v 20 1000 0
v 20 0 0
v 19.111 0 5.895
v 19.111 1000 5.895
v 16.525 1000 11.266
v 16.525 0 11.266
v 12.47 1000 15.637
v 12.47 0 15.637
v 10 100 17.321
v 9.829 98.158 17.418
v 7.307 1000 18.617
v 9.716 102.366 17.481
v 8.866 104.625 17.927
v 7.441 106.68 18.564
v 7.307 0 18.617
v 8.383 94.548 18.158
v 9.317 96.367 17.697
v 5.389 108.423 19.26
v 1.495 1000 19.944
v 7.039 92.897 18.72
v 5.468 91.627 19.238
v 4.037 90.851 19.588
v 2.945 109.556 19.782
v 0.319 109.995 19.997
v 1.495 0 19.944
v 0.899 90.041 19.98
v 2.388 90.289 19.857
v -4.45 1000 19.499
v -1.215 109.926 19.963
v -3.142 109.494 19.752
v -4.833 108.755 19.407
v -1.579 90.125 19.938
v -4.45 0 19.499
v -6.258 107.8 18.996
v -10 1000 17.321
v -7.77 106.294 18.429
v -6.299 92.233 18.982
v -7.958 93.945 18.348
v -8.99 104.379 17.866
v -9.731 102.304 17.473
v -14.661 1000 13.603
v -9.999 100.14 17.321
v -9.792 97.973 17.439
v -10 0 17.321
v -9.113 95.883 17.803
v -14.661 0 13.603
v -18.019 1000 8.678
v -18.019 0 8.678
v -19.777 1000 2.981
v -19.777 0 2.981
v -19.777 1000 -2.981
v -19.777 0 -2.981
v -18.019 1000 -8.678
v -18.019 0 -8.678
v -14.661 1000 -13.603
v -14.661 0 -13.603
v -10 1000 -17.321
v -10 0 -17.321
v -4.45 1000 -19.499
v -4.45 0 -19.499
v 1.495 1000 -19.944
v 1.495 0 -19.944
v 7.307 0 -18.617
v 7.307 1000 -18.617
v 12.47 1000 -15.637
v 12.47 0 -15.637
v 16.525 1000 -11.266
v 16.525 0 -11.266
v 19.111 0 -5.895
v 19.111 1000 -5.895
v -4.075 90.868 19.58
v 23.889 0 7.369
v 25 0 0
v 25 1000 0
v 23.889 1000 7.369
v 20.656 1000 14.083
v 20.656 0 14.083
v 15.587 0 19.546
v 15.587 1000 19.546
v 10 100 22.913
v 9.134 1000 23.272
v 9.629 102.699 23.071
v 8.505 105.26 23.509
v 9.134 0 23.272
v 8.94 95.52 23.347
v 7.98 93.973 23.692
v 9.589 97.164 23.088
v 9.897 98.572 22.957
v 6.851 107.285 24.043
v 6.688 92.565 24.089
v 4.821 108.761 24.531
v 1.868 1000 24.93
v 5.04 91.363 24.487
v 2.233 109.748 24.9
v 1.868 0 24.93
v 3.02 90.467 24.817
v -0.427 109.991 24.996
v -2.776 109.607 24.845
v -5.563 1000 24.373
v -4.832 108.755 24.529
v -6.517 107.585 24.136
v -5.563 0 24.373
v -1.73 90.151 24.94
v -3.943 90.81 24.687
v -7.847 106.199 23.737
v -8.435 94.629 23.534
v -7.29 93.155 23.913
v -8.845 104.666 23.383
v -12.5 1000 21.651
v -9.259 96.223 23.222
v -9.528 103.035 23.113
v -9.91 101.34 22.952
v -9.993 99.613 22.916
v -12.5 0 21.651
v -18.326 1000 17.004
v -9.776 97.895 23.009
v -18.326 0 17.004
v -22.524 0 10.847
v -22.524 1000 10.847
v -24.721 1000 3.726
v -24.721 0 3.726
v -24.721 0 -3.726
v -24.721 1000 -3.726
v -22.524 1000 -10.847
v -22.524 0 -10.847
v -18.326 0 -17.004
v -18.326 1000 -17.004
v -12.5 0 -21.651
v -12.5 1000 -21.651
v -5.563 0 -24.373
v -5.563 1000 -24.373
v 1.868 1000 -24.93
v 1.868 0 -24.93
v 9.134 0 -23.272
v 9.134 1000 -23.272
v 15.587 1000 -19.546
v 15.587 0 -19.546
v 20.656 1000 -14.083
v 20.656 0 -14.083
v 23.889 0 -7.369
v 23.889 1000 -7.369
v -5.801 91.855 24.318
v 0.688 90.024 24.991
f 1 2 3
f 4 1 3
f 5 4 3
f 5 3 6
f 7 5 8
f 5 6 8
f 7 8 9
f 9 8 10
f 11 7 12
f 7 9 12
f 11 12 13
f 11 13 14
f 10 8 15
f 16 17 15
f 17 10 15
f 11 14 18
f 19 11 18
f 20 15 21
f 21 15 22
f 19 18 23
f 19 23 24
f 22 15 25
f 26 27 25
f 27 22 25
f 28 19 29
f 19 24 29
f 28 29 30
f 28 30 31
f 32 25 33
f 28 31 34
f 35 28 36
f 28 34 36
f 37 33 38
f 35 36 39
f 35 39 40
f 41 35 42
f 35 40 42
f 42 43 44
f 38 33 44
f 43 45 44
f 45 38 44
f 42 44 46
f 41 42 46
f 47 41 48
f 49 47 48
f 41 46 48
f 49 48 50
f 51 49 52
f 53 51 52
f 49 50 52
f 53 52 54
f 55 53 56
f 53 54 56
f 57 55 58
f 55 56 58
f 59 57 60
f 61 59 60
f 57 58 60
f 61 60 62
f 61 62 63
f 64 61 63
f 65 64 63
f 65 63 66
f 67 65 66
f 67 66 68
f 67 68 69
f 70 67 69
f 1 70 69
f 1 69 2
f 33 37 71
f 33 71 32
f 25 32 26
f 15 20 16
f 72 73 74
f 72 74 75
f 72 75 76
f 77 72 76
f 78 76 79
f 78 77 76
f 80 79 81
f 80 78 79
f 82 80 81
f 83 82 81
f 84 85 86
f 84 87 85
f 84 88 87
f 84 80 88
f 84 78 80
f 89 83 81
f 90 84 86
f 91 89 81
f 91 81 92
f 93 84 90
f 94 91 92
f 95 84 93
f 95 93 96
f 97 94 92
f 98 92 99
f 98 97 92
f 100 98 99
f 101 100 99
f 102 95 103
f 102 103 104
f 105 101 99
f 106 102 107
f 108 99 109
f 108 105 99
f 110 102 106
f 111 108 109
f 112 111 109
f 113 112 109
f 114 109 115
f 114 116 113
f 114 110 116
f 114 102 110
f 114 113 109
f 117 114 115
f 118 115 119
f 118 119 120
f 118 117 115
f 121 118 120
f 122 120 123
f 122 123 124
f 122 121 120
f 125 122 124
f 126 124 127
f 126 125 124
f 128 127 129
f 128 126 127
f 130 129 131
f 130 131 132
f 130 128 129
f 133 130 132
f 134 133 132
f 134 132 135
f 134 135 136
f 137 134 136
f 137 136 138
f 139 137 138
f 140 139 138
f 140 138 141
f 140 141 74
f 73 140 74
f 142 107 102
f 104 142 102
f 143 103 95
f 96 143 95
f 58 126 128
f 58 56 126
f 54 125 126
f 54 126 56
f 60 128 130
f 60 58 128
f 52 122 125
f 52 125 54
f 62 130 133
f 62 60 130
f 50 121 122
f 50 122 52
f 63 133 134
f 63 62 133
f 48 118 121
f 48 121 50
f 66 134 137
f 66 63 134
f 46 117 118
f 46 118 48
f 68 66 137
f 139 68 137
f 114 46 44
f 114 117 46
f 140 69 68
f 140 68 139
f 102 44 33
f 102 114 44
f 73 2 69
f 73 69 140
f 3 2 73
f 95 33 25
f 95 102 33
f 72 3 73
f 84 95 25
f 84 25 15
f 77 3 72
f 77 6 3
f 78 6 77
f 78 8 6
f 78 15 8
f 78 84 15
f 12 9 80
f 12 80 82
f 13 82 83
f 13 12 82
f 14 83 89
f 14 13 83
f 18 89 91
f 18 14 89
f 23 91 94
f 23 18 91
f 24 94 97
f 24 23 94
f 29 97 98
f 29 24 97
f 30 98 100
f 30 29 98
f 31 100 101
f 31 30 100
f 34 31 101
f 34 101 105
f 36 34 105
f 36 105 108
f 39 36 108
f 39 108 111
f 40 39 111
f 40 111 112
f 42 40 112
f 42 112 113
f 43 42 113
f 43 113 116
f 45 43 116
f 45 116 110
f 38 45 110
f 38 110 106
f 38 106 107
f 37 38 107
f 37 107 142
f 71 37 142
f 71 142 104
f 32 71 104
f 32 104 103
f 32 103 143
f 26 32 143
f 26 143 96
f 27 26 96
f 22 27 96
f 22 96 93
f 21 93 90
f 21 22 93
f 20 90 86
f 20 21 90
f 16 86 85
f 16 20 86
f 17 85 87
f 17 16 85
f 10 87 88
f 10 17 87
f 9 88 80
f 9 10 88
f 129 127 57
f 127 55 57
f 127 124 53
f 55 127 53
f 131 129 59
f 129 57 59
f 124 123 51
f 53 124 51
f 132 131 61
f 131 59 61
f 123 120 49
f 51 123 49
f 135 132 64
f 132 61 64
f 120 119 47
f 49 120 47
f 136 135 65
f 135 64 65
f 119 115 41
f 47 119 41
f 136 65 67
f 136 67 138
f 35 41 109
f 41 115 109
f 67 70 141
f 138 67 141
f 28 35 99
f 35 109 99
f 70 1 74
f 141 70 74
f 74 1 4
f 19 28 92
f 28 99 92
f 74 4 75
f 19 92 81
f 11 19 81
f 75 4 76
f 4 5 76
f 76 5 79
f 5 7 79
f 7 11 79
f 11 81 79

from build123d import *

# Parameters (mm, degrees)
F0_R     = 25
F1_DEPTH = 1000
F2_R     = 20
F3_DEPTH = 1000.001
F4_R     = 10
F5_DEPTH = 25.4


with BuildPart() as f1:
    # F0 (on Front) → F1 (new body)
    with BuildSketch(Plane.XZ):
        Circle(F0_R)
    extrude(amount=-F1_DEPTH)

    # F2 (on Front) → F3 (cut, through all)
    with BuildSketch(Plane.XZ):
        Circle(F2_R)
    extrude(amount=-F3_DEPTH, mode=Mode.SUBTRACT)

    # F4 (on Top) → F5 (cut)
    with BuildSketch(Plane.XY):
        with Locations((0, 100)):
            Circle(F4_R)
    extrude(amount=F5_DEPTH, mode=Mode.SUBTRACT)


solid = f1.part
